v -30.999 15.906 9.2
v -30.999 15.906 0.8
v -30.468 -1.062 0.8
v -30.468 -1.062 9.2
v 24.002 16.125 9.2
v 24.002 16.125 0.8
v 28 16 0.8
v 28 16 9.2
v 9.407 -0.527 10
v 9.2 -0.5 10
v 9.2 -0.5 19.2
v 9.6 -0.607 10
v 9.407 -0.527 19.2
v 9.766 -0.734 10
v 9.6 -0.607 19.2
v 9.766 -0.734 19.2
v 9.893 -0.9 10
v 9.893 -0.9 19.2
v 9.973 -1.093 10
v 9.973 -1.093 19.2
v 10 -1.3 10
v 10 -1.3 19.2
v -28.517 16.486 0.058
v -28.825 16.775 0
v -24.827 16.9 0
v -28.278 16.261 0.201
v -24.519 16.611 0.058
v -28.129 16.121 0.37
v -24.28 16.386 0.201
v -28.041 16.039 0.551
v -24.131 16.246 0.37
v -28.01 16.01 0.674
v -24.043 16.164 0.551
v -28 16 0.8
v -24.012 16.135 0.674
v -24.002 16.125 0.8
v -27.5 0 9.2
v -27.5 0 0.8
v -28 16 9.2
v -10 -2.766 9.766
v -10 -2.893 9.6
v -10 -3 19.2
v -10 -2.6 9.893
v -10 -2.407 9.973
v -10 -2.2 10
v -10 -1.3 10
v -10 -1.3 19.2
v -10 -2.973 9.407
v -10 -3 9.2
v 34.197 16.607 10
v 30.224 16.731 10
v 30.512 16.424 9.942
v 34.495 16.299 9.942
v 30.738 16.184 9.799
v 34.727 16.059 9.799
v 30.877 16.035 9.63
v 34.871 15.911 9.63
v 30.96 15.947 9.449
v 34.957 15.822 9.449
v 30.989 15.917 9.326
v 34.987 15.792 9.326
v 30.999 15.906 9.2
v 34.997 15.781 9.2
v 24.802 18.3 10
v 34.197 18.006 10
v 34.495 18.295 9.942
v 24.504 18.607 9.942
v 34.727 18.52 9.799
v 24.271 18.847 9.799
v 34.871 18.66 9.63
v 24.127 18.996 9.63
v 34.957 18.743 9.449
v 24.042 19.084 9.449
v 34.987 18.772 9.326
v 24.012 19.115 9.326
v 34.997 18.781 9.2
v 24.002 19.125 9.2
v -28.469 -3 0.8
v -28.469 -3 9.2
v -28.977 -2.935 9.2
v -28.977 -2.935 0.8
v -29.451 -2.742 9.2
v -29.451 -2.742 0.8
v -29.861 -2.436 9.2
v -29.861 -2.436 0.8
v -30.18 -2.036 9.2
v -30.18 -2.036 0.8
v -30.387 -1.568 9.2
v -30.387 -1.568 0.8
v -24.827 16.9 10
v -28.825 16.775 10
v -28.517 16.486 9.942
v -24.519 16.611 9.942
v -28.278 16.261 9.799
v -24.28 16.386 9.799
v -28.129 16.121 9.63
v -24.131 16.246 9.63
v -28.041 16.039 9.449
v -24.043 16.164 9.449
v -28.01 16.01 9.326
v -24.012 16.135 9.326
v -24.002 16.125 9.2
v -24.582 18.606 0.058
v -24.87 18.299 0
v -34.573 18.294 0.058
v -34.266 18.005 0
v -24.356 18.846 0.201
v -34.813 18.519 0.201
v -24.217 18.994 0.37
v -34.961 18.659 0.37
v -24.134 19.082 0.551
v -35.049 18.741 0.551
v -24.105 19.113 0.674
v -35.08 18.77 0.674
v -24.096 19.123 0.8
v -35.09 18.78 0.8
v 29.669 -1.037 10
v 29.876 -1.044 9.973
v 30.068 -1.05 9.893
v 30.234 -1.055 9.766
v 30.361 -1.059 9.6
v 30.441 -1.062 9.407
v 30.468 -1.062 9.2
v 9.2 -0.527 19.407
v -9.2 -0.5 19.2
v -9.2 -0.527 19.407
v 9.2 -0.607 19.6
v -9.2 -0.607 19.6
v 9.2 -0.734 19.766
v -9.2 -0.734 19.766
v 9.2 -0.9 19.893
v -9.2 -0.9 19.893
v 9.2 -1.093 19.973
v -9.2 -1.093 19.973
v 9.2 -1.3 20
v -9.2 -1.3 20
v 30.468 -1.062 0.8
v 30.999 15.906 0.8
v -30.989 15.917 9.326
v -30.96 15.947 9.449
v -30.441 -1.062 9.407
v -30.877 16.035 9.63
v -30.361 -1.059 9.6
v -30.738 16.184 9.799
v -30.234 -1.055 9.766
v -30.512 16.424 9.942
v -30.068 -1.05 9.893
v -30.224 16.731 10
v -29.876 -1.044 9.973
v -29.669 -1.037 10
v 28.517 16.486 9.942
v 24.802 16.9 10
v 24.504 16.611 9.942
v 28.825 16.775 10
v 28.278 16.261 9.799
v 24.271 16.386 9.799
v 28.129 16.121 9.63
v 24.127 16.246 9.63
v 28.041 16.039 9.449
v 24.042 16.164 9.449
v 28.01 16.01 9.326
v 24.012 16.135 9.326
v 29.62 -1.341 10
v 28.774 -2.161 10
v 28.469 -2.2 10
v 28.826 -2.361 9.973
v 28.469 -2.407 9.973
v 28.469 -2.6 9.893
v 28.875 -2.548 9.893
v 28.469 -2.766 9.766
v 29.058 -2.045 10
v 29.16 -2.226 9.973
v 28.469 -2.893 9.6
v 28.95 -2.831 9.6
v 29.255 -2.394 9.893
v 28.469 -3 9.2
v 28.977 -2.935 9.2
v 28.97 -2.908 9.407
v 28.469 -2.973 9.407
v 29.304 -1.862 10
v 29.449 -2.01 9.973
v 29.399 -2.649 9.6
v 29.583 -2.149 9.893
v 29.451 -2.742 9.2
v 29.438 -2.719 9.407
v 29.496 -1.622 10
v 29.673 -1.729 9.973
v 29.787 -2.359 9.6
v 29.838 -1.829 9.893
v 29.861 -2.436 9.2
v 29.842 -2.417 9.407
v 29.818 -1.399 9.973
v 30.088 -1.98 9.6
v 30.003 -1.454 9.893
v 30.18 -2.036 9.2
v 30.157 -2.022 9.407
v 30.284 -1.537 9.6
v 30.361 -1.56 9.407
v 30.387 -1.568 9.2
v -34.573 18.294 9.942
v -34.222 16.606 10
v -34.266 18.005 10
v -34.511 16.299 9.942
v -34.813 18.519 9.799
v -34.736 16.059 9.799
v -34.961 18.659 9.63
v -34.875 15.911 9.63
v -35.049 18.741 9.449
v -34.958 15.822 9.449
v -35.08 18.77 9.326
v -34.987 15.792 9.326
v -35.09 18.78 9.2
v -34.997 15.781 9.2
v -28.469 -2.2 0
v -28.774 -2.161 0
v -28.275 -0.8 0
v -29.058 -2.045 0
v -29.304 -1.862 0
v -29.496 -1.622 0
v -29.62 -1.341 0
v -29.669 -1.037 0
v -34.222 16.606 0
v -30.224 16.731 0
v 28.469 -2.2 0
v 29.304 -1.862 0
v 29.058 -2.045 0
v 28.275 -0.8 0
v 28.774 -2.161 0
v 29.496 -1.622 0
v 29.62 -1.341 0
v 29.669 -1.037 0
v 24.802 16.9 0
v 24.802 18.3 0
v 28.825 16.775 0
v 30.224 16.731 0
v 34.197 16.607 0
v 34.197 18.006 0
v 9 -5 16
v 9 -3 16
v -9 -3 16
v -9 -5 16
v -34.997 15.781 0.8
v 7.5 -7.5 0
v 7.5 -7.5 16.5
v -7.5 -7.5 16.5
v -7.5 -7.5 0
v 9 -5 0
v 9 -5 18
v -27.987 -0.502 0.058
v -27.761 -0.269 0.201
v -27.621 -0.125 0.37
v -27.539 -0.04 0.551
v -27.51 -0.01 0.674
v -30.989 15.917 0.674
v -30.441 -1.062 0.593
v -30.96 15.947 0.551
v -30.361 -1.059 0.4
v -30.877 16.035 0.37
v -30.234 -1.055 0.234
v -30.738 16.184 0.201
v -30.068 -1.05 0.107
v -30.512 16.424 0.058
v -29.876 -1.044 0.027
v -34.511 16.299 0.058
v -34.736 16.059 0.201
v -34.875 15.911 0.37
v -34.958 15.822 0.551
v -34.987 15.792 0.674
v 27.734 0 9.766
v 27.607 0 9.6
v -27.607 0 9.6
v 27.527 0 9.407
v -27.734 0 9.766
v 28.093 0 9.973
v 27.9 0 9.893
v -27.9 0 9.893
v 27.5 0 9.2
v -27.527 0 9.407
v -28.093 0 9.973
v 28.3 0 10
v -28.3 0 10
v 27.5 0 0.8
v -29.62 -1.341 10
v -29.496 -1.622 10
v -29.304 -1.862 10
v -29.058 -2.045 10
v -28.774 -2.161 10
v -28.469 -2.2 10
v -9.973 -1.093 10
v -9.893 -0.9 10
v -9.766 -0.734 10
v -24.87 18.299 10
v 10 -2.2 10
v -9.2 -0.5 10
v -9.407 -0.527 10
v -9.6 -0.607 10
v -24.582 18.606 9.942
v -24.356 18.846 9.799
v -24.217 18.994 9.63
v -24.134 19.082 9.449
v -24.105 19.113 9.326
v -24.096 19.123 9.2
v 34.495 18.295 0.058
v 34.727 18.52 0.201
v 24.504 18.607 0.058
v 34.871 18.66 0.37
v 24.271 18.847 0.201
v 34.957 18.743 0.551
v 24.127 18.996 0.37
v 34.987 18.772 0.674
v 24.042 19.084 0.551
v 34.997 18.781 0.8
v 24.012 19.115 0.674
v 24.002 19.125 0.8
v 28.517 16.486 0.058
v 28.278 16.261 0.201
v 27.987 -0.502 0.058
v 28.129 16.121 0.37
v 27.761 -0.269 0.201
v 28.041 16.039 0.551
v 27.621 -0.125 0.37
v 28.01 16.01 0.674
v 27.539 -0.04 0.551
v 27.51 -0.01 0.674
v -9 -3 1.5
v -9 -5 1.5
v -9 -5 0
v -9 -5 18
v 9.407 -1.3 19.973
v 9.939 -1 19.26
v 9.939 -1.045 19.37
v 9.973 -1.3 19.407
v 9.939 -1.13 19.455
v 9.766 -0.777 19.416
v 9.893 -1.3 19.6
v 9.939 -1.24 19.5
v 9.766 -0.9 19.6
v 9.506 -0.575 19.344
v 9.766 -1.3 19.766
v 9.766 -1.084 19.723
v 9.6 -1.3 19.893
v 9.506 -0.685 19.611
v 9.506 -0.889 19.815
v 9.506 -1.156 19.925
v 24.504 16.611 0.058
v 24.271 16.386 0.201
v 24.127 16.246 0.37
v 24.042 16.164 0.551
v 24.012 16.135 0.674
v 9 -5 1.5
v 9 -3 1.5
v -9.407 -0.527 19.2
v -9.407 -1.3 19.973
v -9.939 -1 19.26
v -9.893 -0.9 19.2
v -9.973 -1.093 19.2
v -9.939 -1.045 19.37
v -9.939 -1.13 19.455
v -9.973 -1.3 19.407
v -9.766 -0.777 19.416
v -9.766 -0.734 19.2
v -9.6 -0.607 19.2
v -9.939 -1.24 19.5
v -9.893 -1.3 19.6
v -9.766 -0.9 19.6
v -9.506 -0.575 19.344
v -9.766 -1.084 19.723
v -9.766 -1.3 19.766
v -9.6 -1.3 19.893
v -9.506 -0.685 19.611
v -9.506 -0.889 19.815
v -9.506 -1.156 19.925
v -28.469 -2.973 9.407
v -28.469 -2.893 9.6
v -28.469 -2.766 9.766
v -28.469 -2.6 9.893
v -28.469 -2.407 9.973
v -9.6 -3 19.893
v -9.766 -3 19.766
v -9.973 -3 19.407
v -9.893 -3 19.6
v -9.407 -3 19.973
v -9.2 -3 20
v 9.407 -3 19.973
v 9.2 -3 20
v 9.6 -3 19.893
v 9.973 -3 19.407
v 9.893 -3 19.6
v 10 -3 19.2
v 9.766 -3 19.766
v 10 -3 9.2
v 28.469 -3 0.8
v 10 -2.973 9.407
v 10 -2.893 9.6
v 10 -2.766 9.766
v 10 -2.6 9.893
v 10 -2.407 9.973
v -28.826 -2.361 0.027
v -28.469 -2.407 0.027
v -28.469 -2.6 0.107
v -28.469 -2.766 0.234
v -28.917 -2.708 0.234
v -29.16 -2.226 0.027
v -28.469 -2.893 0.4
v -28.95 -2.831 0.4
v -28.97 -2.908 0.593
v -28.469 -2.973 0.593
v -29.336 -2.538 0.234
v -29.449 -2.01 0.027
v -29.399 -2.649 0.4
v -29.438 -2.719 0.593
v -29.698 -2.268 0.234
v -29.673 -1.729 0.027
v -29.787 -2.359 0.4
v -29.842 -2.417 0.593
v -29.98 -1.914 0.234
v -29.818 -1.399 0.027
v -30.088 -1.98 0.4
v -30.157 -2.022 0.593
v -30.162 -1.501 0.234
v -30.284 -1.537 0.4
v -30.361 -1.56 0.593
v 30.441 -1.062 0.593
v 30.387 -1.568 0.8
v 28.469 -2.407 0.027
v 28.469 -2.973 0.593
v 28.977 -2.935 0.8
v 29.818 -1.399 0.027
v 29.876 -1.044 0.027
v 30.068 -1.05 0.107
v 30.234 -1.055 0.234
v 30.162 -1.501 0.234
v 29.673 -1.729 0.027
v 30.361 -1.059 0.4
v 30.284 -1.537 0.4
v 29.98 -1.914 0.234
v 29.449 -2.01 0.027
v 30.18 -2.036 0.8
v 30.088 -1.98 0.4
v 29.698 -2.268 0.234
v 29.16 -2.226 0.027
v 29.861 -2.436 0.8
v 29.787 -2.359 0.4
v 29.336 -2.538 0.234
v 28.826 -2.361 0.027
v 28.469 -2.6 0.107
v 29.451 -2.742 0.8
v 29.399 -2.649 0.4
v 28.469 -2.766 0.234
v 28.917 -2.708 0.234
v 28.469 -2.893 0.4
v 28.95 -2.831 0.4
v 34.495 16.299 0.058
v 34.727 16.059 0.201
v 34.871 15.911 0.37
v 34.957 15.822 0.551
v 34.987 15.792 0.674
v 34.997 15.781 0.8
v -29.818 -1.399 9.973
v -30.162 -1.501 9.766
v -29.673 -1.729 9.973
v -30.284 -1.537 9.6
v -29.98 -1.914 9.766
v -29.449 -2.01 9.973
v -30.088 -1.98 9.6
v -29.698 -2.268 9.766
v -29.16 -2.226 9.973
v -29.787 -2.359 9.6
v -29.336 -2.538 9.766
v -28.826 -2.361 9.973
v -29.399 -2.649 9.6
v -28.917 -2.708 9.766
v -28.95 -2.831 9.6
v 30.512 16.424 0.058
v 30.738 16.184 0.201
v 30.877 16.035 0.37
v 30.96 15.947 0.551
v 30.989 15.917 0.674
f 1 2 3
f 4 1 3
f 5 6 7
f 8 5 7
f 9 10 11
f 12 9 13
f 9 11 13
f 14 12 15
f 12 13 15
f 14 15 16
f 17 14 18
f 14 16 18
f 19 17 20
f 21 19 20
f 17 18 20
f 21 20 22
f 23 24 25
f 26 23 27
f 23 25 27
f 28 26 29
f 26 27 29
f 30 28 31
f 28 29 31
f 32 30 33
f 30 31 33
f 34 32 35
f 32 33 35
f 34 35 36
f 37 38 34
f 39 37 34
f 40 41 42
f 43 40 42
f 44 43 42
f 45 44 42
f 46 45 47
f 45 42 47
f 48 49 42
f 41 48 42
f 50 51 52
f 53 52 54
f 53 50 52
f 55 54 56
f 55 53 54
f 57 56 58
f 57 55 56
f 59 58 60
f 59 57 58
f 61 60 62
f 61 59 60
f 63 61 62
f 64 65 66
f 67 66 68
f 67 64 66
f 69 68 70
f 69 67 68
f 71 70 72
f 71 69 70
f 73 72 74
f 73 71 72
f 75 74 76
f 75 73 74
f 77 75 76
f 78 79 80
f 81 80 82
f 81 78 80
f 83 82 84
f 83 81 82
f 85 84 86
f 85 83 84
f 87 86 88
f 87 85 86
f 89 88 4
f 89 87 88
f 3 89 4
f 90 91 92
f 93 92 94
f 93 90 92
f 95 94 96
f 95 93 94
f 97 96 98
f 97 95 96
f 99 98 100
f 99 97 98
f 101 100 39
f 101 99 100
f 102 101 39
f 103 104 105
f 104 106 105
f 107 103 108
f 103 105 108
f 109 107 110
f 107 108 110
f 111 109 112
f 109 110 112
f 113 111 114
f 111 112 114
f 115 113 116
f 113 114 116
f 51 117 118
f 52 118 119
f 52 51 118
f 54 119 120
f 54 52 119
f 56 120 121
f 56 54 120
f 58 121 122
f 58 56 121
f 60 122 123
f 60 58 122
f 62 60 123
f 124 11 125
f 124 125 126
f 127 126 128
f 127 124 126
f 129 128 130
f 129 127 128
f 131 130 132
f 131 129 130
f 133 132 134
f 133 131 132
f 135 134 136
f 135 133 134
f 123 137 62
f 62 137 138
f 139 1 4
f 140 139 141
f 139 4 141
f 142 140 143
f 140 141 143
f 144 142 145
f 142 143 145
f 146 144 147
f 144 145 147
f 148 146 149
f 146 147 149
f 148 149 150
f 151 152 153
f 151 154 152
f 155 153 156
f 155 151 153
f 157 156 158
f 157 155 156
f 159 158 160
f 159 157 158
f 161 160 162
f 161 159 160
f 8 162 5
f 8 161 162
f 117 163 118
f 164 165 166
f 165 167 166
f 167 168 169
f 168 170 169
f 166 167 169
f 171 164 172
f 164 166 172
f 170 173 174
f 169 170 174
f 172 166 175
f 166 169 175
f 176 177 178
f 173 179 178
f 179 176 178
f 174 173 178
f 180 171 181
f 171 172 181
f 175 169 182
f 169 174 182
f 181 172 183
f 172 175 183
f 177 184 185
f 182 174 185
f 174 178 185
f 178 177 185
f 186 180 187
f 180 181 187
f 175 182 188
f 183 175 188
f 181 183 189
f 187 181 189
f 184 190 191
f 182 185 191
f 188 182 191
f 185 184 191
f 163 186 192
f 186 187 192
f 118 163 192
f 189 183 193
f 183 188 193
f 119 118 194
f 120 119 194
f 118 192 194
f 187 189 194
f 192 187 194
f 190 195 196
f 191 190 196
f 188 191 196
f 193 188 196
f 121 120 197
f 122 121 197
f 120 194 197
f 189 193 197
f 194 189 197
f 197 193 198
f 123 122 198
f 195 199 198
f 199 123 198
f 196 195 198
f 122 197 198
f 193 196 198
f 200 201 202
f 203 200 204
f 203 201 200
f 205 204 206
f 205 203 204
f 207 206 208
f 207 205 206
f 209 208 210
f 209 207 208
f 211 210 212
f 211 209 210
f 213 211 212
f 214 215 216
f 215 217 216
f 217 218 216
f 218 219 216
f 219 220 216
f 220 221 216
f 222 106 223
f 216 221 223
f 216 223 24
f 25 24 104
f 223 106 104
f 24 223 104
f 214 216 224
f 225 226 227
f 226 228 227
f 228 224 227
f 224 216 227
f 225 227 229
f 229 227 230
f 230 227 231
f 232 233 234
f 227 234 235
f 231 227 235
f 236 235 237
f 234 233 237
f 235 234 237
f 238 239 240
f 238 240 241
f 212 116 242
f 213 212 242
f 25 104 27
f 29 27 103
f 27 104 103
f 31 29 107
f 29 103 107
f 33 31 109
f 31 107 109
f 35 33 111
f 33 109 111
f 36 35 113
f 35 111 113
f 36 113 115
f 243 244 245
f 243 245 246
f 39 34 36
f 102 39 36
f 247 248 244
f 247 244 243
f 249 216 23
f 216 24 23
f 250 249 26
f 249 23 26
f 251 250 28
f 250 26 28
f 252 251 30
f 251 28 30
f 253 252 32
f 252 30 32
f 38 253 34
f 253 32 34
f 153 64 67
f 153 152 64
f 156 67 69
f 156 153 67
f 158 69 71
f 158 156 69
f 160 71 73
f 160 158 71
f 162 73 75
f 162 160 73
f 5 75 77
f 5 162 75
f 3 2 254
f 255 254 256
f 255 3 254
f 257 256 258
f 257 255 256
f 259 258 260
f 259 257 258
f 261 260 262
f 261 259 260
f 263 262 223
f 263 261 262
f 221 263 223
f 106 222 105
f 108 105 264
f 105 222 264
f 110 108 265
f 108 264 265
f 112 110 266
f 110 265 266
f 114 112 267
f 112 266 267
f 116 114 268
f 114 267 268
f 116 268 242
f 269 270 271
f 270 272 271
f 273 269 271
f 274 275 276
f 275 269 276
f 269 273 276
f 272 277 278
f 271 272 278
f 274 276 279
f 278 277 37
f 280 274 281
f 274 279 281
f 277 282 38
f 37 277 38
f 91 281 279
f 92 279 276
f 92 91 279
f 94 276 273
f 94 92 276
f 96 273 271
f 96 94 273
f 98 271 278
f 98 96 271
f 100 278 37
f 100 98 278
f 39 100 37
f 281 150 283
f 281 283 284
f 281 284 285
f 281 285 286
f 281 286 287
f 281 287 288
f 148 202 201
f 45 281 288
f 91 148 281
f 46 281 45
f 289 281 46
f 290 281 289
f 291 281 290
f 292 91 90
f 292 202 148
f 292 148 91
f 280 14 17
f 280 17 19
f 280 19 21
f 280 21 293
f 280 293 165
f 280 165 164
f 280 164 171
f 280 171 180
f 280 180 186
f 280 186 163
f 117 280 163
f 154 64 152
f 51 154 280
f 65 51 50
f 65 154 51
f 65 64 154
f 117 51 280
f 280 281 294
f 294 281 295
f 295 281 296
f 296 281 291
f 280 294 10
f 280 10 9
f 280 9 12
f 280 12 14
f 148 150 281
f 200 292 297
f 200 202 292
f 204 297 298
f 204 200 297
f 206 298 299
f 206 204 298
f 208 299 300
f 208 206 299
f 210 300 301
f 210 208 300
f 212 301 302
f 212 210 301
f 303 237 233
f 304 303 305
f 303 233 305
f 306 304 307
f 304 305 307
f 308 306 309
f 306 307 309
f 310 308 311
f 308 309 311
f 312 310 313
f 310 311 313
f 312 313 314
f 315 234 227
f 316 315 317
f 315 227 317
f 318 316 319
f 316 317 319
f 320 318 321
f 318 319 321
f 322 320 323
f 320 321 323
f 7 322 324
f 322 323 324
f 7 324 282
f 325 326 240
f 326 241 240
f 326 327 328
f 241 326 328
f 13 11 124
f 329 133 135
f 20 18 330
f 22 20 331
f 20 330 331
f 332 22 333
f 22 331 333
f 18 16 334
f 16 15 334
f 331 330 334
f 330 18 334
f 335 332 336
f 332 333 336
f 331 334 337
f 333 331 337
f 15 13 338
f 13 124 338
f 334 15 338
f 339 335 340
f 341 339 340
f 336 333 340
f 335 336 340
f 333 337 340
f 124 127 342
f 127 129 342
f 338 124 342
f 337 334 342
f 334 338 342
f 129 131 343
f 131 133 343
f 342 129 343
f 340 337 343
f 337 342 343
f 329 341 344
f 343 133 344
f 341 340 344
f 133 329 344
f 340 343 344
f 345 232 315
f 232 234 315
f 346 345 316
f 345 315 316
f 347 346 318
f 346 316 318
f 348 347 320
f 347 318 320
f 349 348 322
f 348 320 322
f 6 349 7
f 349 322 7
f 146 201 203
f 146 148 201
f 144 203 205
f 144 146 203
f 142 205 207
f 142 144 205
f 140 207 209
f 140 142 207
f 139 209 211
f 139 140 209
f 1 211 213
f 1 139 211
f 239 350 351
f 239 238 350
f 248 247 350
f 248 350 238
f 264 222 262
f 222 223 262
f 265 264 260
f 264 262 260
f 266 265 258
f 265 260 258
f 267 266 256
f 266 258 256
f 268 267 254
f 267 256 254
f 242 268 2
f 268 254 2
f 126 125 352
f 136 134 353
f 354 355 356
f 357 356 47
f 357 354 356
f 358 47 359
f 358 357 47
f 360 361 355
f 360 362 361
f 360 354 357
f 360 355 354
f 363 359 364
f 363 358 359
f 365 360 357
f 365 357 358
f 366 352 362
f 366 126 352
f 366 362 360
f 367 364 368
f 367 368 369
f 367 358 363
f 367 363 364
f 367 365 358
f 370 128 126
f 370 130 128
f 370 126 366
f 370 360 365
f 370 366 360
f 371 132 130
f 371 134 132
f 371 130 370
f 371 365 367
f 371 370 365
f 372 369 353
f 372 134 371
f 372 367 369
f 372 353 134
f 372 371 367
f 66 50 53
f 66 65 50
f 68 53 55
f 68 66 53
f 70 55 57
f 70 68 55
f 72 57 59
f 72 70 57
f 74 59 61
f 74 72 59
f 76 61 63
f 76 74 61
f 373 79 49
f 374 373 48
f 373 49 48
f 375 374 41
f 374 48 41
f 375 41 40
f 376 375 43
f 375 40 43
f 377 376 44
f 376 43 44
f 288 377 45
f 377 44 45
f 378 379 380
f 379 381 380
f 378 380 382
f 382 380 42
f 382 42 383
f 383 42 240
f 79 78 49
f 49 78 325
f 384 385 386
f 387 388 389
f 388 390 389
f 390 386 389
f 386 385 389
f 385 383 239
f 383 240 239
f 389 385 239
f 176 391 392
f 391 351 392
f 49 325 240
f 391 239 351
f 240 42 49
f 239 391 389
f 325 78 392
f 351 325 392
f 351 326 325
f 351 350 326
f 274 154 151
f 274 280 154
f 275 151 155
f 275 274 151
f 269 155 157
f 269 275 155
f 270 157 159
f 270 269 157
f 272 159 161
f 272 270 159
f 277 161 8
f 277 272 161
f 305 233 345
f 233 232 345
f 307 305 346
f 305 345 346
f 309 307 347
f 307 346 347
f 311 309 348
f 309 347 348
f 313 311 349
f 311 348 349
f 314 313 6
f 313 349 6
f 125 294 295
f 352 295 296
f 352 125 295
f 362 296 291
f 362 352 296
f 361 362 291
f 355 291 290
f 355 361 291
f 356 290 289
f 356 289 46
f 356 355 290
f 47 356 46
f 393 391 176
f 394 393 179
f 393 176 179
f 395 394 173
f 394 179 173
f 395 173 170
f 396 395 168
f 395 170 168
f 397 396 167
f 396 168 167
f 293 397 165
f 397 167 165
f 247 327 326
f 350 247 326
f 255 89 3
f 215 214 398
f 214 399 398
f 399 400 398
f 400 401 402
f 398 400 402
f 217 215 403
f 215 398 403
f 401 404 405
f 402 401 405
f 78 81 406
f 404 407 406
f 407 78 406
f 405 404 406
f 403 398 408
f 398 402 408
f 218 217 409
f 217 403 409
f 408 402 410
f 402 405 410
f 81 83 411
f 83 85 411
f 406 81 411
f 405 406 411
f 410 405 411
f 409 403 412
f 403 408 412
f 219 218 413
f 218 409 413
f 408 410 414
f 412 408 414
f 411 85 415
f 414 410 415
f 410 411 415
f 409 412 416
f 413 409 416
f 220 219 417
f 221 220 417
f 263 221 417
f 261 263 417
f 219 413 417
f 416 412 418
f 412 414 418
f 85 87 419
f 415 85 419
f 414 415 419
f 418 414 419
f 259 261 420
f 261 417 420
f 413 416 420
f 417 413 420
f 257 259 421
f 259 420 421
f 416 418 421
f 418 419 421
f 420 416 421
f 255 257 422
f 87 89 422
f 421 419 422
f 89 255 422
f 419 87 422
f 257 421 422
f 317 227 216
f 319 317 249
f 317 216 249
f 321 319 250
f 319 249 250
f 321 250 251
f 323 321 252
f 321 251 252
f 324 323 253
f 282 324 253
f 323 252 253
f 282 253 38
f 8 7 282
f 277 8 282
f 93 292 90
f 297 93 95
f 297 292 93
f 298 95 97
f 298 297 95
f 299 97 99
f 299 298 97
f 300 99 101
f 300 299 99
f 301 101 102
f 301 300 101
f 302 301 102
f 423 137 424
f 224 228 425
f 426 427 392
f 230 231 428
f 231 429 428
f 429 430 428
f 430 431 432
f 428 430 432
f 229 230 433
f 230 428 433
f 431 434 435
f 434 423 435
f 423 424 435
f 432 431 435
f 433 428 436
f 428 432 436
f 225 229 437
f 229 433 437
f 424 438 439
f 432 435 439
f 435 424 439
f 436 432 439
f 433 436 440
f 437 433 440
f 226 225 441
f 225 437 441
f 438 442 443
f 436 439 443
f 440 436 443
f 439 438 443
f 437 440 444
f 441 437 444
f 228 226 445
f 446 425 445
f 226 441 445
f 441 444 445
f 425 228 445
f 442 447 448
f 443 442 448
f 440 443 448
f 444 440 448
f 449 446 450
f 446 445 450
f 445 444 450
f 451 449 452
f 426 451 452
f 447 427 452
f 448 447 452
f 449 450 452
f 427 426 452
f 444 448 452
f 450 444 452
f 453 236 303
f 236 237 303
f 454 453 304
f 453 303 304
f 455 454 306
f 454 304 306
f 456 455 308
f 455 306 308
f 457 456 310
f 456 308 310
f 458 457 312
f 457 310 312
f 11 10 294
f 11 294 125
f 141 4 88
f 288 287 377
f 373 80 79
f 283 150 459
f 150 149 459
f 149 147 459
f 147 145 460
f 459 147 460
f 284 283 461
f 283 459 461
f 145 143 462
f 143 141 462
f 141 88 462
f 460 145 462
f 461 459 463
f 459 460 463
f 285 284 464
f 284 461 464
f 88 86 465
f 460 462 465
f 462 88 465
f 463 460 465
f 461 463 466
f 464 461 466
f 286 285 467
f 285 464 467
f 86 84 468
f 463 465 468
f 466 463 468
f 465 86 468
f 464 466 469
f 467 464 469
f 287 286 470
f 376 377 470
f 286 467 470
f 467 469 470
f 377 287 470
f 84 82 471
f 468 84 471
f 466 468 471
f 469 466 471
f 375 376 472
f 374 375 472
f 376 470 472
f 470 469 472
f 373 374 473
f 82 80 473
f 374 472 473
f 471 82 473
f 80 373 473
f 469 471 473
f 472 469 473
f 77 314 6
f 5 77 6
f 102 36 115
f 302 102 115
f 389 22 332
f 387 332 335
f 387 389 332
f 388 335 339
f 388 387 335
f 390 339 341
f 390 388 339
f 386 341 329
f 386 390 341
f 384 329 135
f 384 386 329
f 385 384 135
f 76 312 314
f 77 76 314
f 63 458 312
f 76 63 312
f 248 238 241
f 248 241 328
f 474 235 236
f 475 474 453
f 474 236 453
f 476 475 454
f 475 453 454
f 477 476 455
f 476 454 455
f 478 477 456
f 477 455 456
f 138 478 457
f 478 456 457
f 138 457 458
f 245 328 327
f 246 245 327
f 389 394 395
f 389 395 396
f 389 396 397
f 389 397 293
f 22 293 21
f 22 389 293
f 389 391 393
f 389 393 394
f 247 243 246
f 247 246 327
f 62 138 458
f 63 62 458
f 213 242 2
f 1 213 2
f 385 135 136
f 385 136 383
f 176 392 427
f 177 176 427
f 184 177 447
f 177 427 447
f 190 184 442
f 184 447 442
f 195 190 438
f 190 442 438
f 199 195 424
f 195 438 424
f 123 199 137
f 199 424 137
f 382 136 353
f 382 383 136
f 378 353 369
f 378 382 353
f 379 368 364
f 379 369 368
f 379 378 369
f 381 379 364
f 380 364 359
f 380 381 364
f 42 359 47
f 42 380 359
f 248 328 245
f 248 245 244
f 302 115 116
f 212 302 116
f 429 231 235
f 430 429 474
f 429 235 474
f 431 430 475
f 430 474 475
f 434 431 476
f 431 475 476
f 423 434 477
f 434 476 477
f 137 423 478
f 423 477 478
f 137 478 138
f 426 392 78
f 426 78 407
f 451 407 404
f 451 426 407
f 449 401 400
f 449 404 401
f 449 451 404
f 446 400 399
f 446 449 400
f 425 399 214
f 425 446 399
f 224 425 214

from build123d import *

# Parameters (mm, degrees)
F1_DEPTH      = 10
F3_DEPTH      = 10
F4_DEPTH      = 9
F5_DEPTH      = 9
F6_SIZE2      = 2.49999
F6_SIZE       = 1.49999
F7_R          = 0.8
F8_R          = 0.8
F9_R          = 0.8
F10_T1_DEPTH  = 10
F10_T4_ANGLE  = 88.2100893918
F10_T6_ANGLE  = 88.2100893918
F10_T8_ANGLE  = 88.2100893918
F10_T10_ANGLE = 88.2100893918


# Not quite as in the source:
# - a fillet or chamfer that OpenCascade refuses, or shapes differently, is made with other operations: its cross-section is extruded or revolved along the edge and cut away or added
# - a fillet or chamfer is up to 0.001 mm smaller than in the source, because OpenCascade refuses the exact size


with BuildPart() as f1:
    # F0 (on Top) → F1 (new body)
    with BuildSketch(Plane.XY):
        Polygon((27.5, 0), (-27.5, 0), (-28, 16), (-30.9985362283, 15.9062957429), (-30.4077144863, -3), (30.4077144863, -3), (30.9985362283, 15.9062957429), (28, 16), align=None)
        Polygon((-30.9985362283, 15.9062957429), (-28, 16), (-24.0019516957, 16.1249390095), (-24.0956559528, 19.1234752378), (-35.0902887897, 18.7798929616), (-34.9965845326, 15.7813567334), align=None)
        Polygon((24.0019516957, 16.1249390095), (28, 16), (30.9985362283, 15.9062957429), (34.9965845326, 15.7813567334), (34.9965845326, 18.7813567334), (24.0019516957, 19.1249390095), align=None)
    extrude(amount=F1_DEPTH)

    # F2 (on Right) → F3 (join, symmetric)
    with BuildSketch(Plane.YZ):
        Polygon((-3, 16), (-3, 10), (-0.5, 10), (-0.5, 20), (-3, 20), align=None)
    extrude(amount=F3_DEPTH, both=True)

    # F2 (on Right) → F4 (join, symmetric)
    with BuildSketch(Plane.YZ):
        Polygon((-3, 1.5), (-3, 10), (-3, 16), (-5, 16), (-5, 1.5), align=None)
    extrude(amount=F4_DEPTH, both=True)

    # F2 (on Right) → F5 (join, symmetric)
    with BuildSketch(Plane.YZ):
        Polygon((-5, 0), (-5, 1.5), (-5, 16), (-5, 18), (-7.5, 18), (-7.5, 0), align=None)
    extrude(amount=F5_DEPTH, both=True)

    # F6 (size 1.5 and 2.5 in the source; OpenCascade refuses exactly that, so slightly less here)
    f6_edges = [f1.edges().sort_by_distance(p)[0] for p in [
        (0, -7.5, 18),
        (-9, -7.5, 9),
        (9, -7.5, 9),
    ]]
    f6_side = f1.faces().sort_by_distance((0, -7.5, 9))[0]
    chamfer(f6_edges, length=F6_SIZE, length2=F6_SIZE2, reference=f6_side)

    # F7
    f7_edges = [f1.edges().sort_by_distance(p)[0] for p in [
        (27.75, 8, 0),
        (0, 0, 0),
        (-27.75, 8, 0),
        (-26.000976, 16.06247, 0),
        (-24.048804, 17.624207, 0),
        (-29.592972, 18.951684, 0),
        (-35.043437, 17.280625, 0),
        (-32.99756, 15.843826, 0),
        (-30.703125, 6.453148, 0),
        (0, -3, 0),
        (30.703125, 6.453148, 0),
        (32.99756, 15.843826, 0),
        (34.996585, 17.281357, 0),
        (29.499268, 18.953148, 0),
        (24.001952, 17.624939, 0),
        (26.000976, 16.06247, 0),
    ]]
    fillet(f7_edges, radius=F7_R)

    # F8
    f8_edges = [f1.edges().sort_by_distance(p)[0] for p in [
        (-29.592972, 18.951684, 10),
        (-35.043437, 17.280625, 10),
        (-32.99756, 15.843826, 10),
        (-26.000976, 16.06247, 10),
        (-24.048804, 17.624207, 10),
        (-27.75, 8, 10),
        (-30.703125, 6.453148, 10),
        (-20.203857, -3, 10),
        (20.203857, -3, 10),
        (30.703125, 6.453148, 10),
        (32.99756, 15.843826, 10),
        (34.996585, 17.281357, 10),
        (29.499268, 18.953148, 10),
        (24.001952, 17.624939, 10),
        (26.000976, 16.06247, 10),
        (27.75, 8, 10),
    ]]
    fillet(f8_edges, radius=F8_R)

    # F9
    f9_edges = [f1.edges().sort_by_distance(p)[0] for p in [
        (0, -0.5, 20),
        (-10, -0.5, 15),
        (10, -0.5, 15),
        (10, -1.75, 20),
        (-10, -1.75, 20),
    ]]
    fillet(f9_edges, radius=F9_R)

    # F10: fillet of radius 2 on 2 edges, made by hand

    # F10_s2 → F10_t1 (cut)
    with BuildSketch(Plane.XY):
        with BuildLine():
            ThreePointArc((-28.4692381621, -3), (-29.861190207, -2.4361300445), (-30.4682623143, -1.0624695048))
            Line((-30.4682623143, -1.0624695048), (-30.4077144863, -3))
            Line((-30.4077144863, -3), (-28.4692381621, -3))
        make_face()
        with BuildLine():
            ThreePointArc((28.4692381621, -3), (29.861190207, -2.4361300445), (30.4682623143, -1.0624695048))
            Line((30.4682623143, -1.0624695048), (30.4077144863, -3))
            Line((30.4077144863, -3), (28.4692381621, -3))
        make_face()
    extrude(amount=F10_T1_DEPTH, mode=Mode.SUBTRACT)

    # F10_s3 → F10_t4 (revolve, cut)
    with BuildSketch(Plane(origin=(-0.0034446457, -0.1102286623, 0), x_dir=(0, 0, 1), z_dir=(0.0312347524, 0.9995120761, 0))):
        with BuildLine():
            ThreePointArc((0, 29.6865820924), (0.2343145751, 30.2522675173), (0.8, 30.4865820924))
            Line((0.8, 30.4865820924), (0, 30.4865820924))
            Line((0, 30.4865820924), (0, 29.6865820924))
        make_face()
    revolve(axis=Axis((28.4692381621, -1, 0), (0, 0, -1)), revolution_arc=F10_T4_ANGLE, mode=Mode.SUBTRACT)

    # F10_s5 → F10_t6 (revolve, cut)
    with BuildSketch(Plane.YZ.offset(28.4692381621)):
        with BuildLine():
            ThreePointArc((-2.2, 10), (-2.7656854249, 9.7656854249), (-3, 9.2))
            Line((-3, 9.2), (-3, 10))
            Line((-3, 10), (-2.2, 10))
        make_face()
    revolve(axis=Axis((28.4692381621, -1, 10), (0, 0, 1)), revolution_arc=F10_T6_ANGLE, mode=Mode.SUBTRACT)

    # F10_s7 → F10_t8 (revolve, cut)
    with BuildSketch(Plane.YZ.offset(-28.4692381621)):
        with BuildLine():
            ThreePointArc((-2.2, 0), (-2.7656854249, 0.2343145751), (-3, 0.8))
            Line((-3, 0.8), (-3, 0))
            Line((-3, 0), (-2.2, 0))
        make_face()
    revolve(axis=Axis((-28.4692381621, -1, 0), (0, 0, -1)), revolution_arc=F10_T8_ANGLE, mode=Mode.SUBTRACT)

    # F10_s9 → F10_t10 (revolve, cut)
    with BuildSketch(Plane(origin=(0.0034446457, -0.1102286623, 0), x_dir=(0, 0, 1), z_dir=(-0.0312347524, 0.9995120761, 0))):
        with BuildLine():
            ThreePointArc((10, -29.6865820924), (9.7656854249, -30.2522675173), (9.2, -30.4865820924))
            Line((9.2, -30.4865820924), (10, -30.4865820924))
            Line((10, -30.4865820924), (10, -29.6865820924))
        make_face()
    revolve(axis=Axis((-28.4692381621, -1, 10), (0, 0, 1)), revolution_arc=F10_T10_ANGLE, mode=Mode.SUBTRACT)


solid = f1.part
